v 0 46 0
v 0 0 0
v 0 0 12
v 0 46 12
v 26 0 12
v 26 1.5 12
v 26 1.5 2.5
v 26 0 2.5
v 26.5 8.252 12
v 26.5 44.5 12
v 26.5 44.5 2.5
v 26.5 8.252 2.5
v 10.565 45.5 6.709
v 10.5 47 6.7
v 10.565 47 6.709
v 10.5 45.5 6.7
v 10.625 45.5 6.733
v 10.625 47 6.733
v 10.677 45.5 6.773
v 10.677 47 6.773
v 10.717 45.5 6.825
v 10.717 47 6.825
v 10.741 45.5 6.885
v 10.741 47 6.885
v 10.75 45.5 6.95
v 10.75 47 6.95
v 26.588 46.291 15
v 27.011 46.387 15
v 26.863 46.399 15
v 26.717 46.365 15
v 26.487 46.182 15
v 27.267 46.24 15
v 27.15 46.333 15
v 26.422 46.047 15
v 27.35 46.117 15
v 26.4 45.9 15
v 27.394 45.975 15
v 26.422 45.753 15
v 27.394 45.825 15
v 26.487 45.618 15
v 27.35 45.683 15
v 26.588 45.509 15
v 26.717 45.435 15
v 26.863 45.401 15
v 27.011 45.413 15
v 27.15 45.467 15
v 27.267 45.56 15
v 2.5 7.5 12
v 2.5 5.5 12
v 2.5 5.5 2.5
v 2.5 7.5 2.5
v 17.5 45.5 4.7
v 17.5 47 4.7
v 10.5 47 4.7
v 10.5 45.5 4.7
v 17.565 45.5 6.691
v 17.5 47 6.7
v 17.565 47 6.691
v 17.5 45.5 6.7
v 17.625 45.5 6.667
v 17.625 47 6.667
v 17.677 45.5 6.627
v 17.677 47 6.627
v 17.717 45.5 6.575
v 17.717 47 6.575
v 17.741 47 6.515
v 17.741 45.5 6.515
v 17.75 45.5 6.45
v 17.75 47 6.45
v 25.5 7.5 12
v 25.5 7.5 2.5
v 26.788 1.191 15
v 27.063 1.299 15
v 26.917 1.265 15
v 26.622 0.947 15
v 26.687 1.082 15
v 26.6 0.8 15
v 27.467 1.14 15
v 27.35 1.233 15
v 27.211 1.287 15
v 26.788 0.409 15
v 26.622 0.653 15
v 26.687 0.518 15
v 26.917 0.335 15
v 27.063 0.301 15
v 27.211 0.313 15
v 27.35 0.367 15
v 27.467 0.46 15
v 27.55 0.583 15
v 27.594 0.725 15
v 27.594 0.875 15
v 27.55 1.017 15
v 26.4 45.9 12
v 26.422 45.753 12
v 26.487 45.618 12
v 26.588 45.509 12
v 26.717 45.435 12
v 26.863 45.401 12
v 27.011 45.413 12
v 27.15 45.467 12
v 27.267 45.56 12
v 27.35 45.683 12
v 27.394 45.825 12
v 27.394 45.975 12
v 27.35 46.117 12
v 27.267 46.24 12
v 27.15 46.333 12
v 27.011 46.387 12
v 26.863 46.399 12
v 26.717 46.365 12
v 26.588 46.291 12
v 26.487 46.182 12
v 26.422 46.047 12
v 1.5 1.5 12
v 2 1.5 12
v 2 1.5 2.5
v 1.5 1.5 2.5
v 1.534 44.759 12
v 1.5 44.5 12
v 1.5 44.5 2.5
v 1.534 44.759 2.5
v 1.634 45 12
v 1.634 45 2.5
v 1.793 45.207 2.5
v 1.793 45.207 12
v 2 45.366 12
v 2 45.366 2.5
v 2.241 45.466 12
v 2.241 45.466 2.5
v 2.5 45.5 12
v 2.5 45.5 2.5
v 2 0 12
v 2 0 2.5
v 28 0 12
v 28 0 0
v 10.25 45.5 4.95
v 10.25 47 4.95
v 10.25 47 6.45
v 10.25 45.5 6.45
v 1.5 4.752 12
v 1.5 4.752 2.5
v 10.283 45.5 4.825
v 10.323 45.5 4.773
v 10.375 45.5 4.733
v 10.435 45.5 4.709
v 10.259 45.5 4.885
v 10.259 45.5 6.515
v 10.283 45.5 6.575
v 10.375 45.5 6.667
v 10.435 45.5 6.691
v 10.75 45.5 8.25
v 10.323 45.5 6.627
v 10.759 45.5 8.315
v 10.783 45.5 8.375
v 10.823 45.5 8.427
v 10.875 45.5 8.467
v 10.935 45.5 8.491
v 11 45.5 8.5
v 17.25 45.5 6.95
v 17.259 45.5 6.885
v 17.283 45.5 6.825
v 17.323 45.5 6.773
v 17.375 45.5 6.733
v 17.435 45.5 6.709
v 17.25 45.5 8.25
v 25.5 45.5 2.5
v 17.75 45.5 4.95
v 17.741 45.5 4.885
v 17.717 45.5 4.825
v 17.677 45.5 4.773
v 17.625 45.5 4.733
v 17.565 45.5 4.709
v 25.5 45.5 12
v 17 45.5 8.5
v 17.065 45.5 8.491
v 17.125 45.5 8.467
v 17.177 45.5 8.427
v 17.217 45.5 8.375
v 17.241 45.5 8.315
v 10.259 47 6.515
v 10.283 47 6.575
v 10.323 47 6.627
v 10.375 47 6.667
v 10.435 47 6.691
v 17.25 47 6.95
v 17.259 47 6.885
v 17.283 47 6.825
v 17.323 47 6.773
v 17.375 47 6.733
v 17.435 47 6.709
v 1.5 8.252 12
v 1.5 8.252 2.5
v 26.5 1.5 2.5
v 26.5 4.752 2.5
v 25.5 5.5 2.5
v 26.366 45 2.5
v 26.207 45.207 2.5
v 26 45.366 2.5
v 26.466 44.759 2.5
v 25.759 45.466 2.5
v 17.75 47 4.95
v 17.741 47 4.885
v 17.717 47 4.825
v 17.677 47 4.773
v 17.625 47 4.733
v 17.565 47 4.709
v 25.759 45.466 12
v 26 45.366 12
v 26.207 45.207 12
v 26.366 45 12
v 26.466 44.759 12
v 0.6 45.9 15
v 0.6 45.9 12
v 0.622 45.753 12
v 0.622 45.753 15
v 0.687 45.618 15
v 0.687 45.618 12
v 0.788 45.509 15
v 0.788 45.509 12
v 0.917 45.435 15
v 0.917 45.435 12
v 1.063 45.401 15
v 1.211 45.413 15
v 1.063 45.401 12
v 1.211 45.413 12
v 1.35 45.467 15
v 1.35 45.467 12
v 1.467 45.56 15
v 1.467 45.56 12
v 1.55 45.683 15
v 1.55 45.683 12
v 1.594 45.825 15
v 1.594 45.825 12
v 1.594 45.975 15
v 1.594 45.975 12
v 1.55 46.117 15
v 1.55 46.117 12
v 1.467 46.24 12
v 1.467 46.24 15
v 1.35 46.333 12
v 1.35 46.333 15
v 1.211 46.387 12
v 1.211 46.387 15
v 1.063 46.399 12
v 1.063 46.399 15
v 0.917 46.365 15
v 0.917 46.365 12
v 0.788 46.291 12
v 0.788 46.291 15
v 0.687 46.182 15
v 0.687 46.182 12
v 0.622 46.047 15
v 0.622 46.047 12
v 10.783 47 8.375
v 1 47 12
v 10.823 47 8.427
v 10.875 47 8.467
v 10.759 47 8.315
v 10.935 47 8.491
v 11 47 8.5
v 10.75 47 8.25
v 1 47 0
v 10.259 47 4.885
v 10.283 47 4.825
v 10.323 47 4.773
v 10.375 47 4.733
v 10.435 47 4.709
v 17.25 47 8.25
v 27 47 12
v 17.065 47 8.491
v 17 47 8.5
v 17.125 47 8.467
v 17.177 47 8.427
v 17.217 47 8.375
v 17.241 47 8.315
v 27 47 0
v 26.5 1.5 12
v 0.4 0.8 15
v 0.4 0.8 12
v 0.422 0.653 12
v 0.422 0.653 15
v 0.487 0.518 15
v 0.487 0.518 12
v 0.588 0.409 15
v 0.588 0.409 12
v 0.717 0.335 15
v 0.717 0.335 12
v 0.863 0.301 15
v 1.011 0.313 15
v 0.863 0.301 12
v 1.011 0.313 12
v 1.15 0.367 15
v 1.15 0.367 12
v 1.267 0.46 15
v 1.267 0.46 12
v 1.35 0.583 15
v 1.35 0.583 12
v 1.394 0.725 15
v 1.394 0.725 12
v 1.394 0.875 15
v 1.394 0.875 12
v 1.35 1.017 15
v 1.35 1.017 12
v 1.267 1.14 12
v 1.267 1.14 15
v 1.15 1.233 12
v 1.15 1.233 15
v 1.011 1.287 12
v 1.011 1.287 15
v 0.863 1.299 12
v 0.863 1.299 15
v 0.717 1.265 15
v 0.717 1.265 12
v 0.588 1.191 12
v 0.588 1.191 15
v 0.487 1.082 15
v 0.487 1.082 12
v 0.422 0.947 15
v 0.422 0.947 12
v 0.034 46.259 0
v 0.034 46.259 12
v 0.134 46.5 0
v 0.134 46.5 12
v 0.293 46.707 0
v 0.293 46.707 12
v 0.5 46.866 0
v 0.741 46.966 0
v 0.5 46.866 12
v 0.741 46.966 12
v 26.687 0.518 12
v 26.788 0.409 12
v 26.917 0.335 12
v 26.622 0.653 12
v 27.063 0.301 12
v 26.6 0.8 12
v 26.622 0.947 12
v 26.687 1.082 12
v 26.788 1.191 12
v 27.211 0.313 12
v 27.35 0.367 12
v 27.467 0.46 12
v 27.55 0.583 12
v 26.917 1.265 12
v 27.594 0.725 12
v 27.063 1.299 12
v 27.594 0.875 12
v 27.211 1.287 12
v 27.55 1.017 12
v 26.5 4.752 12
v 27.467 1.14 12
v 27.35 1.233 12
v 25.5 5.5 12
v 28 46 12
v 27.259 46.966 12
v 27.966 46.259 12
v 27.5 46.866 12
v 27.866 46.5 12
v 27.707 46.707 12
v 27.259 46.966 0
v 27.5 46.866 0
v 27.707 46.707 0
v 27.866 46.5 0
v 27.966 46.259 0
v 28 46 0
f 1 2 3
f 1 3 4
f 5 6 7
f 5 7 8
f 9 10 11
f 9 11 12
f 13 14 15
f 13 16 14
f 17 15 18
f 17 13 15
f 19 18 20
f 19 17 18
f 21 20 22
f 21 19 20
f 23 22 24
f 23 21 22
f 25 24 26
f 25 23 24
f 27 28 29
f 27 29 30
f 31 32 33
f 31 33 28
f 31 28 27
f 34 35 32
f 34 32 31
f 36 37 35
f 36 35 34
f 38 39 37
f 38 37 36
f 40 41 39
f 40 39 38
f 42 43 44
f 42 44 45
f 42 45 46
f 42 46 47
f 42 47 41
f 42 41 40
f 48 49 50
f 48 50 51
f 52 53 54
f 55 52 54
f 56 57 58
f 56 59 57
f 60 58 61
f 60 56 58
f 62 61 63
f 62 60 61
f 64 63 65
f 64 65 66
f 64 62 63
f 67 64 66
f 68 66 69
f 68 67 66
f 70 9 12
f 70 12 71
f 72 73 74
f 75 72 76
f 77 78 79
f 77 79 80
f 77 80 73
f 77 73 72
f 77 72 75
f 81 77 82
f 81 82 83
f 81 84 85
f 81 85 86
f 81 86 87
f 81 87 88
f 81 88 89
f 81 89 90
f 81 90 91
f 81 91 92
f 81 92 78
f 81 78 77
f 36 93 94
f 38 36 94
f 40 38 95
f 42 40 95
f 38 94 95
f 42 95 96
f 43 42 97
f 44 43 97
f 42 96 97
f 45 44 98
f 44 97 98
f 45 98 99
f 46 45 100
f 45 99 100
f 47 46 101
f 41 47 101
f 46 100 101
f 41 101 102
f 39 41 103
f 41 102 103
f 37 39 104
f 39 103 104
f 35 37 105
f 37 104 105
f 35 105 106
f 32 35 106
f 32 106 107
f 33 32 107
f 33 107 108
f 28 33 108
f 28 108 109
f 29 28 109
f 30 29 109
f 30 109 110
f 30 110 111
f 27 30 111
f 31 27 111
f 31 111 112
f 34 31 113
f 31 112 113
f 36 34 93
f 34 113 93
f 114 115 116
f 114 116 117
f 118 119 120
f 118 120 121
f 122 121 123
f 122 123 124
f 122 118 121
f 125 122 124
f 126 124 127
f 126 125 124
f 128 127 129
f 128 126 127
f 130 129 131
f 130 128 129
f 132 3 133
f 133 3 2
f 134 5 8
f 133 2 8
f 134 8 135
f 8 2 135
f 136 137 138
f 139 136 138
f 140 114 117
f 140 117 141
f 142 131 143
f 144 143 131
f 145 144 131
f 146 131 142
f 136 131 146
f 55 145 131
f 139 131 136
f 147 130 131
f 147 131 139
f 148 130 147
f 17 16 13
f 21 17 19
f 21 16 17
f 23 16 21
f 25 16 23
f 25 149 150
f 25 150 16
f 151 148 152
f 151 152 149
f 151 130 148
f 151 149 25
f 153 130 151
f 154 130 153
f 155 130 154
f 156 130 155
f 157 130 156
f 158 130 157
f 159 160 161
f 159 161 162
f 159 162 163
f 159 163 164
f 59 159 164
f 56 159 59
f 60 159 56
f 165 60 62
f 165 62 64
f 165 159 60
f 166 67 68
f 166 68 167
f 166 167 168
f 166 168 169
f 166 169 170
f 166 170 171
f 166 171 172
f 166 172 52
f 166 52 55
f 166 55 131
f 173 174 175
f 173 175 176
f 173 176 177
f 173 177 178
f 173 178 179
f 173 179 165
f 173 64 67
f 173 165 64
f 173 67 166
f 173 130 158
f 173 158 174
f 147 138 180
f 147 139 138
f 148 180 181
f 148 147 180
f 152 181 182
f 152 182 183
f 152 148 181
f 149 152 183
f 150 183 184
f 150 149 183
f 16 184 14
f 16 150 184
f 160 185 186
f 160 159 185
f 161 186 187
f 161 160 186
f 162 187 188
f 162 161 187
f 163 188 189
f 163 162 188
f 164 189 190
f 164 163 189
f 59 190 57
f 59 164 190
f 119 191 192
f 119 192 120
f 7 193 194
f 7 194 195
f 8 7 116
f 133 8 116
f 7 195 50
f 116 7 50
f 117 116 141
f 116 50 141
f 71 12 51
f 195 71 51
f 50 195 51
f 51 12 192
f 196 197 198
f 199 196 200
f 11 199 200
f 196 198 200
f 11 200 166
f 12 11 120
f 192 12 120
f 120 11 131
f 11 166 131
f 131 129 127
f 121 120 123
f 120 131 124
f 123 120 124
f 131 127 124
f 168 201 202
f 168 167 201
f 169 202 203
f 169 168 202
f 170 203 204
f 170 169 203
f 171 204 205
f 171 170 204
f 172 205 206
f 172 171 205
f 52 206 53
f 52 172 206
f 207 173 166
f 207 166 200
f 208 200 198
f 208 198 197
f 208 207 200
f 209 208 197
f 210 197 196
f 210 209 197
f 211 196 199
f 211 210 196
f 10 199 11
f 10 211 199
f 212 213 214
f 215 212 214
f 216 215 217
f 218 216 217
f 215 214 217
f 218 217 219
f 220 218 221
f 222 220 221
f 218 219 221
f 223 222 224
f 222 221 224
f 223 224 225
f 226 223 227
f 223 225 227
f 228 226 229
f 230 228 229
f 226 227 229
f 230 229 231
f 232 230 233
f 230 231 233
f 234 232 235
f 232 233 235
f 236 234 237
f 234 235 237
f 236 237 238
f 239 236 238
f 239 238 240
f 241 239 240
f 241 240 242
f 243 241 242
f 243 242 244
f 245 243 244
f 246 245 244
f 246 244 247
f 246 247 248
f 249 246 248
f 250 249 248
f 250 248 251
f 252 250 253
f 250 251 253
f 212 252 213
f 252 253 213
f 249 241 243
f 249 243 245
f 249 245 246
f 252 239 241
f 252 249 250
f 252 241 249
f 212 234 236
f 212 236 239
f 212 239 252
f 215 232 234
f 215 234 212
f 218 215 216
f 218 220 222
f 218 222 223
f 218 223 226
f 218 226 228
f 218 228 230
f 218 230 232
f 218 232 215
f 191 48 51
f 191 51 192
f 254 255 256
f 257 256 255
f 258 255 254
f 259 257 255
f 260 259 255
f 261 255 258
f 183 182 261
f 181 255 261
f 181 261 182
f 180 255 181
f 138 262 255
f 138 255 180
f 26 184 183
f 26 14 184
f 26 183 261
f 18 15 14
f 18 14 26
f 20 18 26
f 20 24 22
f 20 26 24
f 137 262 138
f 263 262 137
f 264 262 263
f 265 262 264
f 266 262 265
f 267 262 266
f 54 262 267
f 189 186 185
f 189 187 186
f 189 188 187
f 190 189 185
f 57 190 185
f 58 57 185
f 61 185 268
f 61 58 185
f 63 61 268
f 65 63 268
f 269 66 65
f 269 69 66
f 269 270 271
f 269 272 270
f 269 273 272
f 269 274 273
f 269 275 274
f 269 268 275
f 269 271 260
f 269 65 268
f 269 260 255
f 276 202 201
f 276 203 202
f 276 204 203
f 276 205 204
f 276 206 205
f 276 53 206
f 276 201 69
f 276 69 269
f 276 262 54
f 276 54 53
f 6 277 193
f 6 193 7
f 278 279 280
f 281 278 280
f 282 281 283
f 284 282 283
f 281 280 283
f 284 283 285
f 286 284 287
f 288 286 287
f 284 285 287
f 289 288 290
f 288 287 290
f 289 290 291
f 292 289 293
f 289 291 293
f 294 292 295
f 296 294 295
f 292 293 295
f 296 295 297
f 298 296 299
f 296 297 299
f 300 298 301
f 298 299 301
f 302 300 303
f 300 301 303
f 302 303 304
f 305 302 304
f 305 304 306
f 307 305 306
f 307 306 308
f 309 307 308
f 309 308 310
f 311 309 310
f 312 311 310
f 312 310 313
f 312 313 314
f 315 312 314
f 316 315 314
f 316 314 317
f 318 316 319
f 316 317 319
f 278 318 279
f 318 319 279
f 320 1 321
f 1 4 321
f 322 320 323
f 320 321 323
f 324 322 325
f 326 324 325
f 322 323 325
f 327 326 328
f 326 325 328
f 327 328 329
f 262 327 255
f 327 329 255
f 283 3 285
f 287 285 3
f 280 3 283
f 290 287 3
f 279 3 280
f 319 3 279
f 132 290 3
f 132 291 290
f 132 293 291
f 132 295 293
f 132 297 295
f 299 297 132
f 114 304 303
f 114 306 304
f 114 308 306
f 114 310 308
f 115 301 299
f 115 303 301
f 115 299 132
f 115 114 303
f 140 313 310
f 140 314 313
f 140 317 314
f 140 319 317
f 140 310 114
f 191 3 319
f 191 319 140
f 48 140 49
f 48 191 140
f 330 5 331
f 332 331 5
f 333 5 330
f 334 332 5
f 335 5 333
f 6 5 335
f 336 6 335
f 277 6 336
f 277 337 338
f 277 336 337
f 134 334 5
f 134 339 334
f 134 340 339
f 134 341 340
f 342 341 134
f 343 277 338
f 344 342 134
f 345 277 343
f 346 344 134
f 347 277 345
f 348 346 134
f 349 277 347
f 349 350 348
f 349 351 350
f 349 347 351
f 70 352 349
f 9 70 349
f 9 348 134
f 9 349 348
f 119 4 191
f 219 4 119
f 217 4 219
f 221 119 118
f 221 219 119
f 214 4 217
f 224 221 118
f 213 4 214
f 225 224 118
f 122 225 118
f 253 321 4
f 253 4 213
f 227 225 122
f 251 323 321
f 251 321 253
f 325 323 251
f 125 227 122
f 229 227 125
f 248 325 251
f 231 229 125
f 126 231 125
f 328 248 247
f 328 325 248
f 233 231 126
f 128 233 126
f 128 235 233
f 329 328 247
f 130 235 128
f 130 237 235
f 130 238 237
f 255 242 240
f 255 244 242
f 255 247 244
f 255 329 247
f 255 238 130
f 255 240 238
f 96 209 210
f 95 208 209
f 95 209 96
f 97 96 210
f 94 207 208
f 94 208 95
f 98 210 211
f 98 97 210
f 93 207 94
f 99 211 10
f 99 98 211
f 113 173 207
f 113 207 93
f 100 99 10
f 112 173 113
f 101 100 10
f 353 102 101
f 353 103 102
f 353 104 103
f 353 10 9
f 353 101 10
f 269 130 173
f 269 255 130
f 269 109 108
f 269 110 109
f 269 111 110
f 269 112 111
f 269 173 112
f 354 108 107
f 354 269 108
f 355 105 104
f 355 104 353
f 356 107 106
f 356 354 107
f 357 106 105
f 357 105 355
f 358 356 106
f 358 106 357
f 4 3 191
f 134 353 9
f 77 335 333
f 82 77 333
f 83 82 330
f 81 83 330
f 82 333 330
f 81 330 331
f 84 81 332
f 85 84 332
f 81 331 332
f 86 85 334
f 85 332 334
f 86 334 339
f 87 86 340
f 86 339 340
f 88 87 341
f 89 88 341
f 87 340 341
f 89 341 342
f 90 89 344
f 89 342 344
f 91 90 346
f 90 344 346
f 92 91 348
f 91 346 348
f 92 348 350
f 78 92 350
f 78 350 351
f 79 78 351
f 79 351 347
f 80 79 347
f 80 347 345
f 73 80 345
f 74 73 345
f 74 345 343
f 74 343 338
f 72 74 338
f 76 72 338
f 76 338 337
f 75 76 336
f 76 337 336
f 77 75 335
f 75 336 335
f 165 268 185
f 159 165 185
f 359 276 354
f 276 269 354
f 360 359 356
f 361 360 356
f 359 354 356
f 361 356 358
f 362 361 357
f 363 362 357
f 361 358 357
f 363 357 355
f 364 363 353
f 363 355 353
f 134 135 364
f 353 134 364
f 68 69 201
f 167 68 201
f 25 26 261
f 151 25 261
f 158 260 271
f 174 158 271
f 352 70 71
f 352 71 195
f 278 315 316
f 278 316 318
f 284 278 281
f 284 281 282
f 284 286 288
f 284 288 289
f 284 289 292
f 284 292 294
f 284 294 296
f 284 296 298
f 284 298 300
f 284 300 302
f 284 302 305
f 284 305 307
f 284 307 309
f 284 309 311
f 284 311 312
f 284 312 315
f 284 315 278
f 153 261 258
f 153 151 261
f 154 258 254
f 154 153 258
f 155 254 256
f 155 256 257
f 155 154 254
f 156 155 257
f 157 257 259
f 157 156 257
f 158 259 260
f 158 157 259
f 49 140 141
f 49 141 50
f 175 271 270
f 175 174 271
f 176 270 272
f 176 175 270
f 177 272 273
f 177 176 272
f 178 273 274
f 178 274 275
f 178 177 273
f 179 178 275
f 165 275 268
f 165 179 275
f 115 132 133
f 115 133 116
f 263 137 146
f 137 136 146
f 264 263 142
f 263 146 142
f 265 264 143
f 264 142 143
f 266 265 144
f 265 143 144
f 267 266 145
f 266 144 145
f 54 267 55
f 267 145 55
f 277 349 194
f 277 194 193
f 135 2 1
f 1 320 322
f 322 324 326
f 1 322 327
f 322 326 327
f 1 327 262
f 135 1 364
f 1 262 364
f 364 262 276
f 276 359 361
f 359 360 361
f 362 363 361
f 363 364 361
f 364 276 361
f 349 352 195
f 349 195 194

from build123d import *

# Parameters (mm, degrees)
SKIZZE1_W                       = 28
SKIZZE1_H                       = 47
AUFSATZ_LINEAR_AUSTRAGEN1_DEPTH = 12
SCHNITT_LINEAR_AUSTRAGEN1_DEPTH = 9.5
VERRUNDUNG2_R                   = 1
SKIZZE3_R                       = 0.5
AUFSATZ_LINEAR_AUSTRAGEN2_DEPTH = 3
SCHNITT_LINEAR_AUSTRAGEN4_DEPTH = 10
VERRUNDUNG3_R                   = 0.25


with BuildPart() as part:
    # Skizze1 → Aufsatz-Linear austragen1 (new body)
    with BuildSketch(Plane.XY):
        with Locations((14, 23.5)):
            Rectangle(SKIZZE1_W, SKIZZE1_H)
    extrude(amount=AUFSATZ_LINEAR_AUSTRAGEN1_DEPTH)

    # Skizze2 → Schnitt-Linear austragen1 (cut)
    with BuildSketch(Plane.XY.offset(12)):
        with BuildLine():
            Line((2.5, 45.5), (25.5, 45.5))
            ThreePointArc((25.5, 45.5), (26.207106781, 45.207106781), (26.5, 44.5))
            Line((26.5, 44.5), (26.5, 8.251904421))
            Line((26.5, 8.251904421), (25.5, 7.5))
            Line((25.5, 7.5), (25.5, 5.5))
            Line((25.5, 5.5), (26.5, 4.751904421))
            Line((26.5, 4.751904421), (26.5, 1.5))
            Line((26.5, 1.5), (26, 1.5))
            Line((26, 1.5), (26, 0))
            Line((26, 0), (2, 0))
            Line((2, 0), (2, 1.5))
            Line((2, 1.5), (1.5, 1.5))
            Line((1.5, 1.5), (1.5, 4.751904421))
            Line((1.5, 4.751904421), (2.5, 5.5))
            Line((2.5, 5.5), (2.5, 7.5))
            Line((2.5, 7.5), (1.5, 8.251904421))
            Line((1.5, 8.251904421), (1.5, 44.5))
            ThreePointArc((1.5, 44.5), (1.792893219, 45.207106781), (2.5, 45.5))
        make_face()
    extrude(amount=-SCHNITT_LINEAR_AUSTRAGEN1_DEPTH, mode=Mode.SUBTRACT)

    # Verrundung2
    verrundung2_edges = [part.edges().sort_by_distance(p)[0] for p in [
        (0, 47, 6),
        (28, 47, 6),
    ]]
    fillet(verrundung2_edges, radius=VERRUNDUNG2_R)

    # Skizze3 → Aufsatz-Linear austragen2 (add)
    with BuildSketch(Plane.XY.offset(12)):
        with Locations(Location((1.1, 45.9, 0), (0, 0, 180))):
            Circle(SKIZZE3_R)
        with Locations(Location((26.9, 45.9, 0), (0, 0, 180))):
            Circle(SKIZZE3_R)
        with Locations(Location((0.9, 0.8, 0), (0, 0, 180))):
            Circle(SKIZZE3_R)
        with Locations(Location((27.1, 0.8, 0), (0, 0, 180))):
            Circle(SKIZZE3_R)
    extrude(amount=AUFSATZ_LINEAR_AUSTRAGEN2_DEPTH)

    # Skizze4 → Schnitt-Linear austragen4 (cut)
    with BuildSketch(Plane(origin=(0, 47, 0), x_dir=(1, 0, 0), z_dir=(0, 1, 0))):
        Polygon((10.25, -4.7), (10.25, -6.7), (10.75, -6.7), (10.75, -8.5), (17.25, -8.5), (17.25, -6.7), (17.75, -6.7), (17.75, -4.7), align=None)
    extrude(amount=-SCHNITT_LINEAR_AUSTRAGEN4_DEPTH, mode=Mode.SUBTRACT)

    # Verrundung3
    verrundung3_edges = [part.edges().sort_by_distance(p)[0] for p in [
        (17.25, 46.25, 6.7),
        (17.25, 46.25, 8.5),
        (10.75, 46.25, 6.7),
        (10.25, 46.25, 6.7),
        (17.75, 46.25, 6.7),
        (17.75, 46.25, 4.7),
        (10.25, 46.25, 4.7),
        (10.75, 46.25, 8.5),
    ]]
    fillet(verrundung3_edges, radius=VERRUNDUNG3_R - 0.0001)  # a hair under: the kernel refuses the full size


solid = part.part
